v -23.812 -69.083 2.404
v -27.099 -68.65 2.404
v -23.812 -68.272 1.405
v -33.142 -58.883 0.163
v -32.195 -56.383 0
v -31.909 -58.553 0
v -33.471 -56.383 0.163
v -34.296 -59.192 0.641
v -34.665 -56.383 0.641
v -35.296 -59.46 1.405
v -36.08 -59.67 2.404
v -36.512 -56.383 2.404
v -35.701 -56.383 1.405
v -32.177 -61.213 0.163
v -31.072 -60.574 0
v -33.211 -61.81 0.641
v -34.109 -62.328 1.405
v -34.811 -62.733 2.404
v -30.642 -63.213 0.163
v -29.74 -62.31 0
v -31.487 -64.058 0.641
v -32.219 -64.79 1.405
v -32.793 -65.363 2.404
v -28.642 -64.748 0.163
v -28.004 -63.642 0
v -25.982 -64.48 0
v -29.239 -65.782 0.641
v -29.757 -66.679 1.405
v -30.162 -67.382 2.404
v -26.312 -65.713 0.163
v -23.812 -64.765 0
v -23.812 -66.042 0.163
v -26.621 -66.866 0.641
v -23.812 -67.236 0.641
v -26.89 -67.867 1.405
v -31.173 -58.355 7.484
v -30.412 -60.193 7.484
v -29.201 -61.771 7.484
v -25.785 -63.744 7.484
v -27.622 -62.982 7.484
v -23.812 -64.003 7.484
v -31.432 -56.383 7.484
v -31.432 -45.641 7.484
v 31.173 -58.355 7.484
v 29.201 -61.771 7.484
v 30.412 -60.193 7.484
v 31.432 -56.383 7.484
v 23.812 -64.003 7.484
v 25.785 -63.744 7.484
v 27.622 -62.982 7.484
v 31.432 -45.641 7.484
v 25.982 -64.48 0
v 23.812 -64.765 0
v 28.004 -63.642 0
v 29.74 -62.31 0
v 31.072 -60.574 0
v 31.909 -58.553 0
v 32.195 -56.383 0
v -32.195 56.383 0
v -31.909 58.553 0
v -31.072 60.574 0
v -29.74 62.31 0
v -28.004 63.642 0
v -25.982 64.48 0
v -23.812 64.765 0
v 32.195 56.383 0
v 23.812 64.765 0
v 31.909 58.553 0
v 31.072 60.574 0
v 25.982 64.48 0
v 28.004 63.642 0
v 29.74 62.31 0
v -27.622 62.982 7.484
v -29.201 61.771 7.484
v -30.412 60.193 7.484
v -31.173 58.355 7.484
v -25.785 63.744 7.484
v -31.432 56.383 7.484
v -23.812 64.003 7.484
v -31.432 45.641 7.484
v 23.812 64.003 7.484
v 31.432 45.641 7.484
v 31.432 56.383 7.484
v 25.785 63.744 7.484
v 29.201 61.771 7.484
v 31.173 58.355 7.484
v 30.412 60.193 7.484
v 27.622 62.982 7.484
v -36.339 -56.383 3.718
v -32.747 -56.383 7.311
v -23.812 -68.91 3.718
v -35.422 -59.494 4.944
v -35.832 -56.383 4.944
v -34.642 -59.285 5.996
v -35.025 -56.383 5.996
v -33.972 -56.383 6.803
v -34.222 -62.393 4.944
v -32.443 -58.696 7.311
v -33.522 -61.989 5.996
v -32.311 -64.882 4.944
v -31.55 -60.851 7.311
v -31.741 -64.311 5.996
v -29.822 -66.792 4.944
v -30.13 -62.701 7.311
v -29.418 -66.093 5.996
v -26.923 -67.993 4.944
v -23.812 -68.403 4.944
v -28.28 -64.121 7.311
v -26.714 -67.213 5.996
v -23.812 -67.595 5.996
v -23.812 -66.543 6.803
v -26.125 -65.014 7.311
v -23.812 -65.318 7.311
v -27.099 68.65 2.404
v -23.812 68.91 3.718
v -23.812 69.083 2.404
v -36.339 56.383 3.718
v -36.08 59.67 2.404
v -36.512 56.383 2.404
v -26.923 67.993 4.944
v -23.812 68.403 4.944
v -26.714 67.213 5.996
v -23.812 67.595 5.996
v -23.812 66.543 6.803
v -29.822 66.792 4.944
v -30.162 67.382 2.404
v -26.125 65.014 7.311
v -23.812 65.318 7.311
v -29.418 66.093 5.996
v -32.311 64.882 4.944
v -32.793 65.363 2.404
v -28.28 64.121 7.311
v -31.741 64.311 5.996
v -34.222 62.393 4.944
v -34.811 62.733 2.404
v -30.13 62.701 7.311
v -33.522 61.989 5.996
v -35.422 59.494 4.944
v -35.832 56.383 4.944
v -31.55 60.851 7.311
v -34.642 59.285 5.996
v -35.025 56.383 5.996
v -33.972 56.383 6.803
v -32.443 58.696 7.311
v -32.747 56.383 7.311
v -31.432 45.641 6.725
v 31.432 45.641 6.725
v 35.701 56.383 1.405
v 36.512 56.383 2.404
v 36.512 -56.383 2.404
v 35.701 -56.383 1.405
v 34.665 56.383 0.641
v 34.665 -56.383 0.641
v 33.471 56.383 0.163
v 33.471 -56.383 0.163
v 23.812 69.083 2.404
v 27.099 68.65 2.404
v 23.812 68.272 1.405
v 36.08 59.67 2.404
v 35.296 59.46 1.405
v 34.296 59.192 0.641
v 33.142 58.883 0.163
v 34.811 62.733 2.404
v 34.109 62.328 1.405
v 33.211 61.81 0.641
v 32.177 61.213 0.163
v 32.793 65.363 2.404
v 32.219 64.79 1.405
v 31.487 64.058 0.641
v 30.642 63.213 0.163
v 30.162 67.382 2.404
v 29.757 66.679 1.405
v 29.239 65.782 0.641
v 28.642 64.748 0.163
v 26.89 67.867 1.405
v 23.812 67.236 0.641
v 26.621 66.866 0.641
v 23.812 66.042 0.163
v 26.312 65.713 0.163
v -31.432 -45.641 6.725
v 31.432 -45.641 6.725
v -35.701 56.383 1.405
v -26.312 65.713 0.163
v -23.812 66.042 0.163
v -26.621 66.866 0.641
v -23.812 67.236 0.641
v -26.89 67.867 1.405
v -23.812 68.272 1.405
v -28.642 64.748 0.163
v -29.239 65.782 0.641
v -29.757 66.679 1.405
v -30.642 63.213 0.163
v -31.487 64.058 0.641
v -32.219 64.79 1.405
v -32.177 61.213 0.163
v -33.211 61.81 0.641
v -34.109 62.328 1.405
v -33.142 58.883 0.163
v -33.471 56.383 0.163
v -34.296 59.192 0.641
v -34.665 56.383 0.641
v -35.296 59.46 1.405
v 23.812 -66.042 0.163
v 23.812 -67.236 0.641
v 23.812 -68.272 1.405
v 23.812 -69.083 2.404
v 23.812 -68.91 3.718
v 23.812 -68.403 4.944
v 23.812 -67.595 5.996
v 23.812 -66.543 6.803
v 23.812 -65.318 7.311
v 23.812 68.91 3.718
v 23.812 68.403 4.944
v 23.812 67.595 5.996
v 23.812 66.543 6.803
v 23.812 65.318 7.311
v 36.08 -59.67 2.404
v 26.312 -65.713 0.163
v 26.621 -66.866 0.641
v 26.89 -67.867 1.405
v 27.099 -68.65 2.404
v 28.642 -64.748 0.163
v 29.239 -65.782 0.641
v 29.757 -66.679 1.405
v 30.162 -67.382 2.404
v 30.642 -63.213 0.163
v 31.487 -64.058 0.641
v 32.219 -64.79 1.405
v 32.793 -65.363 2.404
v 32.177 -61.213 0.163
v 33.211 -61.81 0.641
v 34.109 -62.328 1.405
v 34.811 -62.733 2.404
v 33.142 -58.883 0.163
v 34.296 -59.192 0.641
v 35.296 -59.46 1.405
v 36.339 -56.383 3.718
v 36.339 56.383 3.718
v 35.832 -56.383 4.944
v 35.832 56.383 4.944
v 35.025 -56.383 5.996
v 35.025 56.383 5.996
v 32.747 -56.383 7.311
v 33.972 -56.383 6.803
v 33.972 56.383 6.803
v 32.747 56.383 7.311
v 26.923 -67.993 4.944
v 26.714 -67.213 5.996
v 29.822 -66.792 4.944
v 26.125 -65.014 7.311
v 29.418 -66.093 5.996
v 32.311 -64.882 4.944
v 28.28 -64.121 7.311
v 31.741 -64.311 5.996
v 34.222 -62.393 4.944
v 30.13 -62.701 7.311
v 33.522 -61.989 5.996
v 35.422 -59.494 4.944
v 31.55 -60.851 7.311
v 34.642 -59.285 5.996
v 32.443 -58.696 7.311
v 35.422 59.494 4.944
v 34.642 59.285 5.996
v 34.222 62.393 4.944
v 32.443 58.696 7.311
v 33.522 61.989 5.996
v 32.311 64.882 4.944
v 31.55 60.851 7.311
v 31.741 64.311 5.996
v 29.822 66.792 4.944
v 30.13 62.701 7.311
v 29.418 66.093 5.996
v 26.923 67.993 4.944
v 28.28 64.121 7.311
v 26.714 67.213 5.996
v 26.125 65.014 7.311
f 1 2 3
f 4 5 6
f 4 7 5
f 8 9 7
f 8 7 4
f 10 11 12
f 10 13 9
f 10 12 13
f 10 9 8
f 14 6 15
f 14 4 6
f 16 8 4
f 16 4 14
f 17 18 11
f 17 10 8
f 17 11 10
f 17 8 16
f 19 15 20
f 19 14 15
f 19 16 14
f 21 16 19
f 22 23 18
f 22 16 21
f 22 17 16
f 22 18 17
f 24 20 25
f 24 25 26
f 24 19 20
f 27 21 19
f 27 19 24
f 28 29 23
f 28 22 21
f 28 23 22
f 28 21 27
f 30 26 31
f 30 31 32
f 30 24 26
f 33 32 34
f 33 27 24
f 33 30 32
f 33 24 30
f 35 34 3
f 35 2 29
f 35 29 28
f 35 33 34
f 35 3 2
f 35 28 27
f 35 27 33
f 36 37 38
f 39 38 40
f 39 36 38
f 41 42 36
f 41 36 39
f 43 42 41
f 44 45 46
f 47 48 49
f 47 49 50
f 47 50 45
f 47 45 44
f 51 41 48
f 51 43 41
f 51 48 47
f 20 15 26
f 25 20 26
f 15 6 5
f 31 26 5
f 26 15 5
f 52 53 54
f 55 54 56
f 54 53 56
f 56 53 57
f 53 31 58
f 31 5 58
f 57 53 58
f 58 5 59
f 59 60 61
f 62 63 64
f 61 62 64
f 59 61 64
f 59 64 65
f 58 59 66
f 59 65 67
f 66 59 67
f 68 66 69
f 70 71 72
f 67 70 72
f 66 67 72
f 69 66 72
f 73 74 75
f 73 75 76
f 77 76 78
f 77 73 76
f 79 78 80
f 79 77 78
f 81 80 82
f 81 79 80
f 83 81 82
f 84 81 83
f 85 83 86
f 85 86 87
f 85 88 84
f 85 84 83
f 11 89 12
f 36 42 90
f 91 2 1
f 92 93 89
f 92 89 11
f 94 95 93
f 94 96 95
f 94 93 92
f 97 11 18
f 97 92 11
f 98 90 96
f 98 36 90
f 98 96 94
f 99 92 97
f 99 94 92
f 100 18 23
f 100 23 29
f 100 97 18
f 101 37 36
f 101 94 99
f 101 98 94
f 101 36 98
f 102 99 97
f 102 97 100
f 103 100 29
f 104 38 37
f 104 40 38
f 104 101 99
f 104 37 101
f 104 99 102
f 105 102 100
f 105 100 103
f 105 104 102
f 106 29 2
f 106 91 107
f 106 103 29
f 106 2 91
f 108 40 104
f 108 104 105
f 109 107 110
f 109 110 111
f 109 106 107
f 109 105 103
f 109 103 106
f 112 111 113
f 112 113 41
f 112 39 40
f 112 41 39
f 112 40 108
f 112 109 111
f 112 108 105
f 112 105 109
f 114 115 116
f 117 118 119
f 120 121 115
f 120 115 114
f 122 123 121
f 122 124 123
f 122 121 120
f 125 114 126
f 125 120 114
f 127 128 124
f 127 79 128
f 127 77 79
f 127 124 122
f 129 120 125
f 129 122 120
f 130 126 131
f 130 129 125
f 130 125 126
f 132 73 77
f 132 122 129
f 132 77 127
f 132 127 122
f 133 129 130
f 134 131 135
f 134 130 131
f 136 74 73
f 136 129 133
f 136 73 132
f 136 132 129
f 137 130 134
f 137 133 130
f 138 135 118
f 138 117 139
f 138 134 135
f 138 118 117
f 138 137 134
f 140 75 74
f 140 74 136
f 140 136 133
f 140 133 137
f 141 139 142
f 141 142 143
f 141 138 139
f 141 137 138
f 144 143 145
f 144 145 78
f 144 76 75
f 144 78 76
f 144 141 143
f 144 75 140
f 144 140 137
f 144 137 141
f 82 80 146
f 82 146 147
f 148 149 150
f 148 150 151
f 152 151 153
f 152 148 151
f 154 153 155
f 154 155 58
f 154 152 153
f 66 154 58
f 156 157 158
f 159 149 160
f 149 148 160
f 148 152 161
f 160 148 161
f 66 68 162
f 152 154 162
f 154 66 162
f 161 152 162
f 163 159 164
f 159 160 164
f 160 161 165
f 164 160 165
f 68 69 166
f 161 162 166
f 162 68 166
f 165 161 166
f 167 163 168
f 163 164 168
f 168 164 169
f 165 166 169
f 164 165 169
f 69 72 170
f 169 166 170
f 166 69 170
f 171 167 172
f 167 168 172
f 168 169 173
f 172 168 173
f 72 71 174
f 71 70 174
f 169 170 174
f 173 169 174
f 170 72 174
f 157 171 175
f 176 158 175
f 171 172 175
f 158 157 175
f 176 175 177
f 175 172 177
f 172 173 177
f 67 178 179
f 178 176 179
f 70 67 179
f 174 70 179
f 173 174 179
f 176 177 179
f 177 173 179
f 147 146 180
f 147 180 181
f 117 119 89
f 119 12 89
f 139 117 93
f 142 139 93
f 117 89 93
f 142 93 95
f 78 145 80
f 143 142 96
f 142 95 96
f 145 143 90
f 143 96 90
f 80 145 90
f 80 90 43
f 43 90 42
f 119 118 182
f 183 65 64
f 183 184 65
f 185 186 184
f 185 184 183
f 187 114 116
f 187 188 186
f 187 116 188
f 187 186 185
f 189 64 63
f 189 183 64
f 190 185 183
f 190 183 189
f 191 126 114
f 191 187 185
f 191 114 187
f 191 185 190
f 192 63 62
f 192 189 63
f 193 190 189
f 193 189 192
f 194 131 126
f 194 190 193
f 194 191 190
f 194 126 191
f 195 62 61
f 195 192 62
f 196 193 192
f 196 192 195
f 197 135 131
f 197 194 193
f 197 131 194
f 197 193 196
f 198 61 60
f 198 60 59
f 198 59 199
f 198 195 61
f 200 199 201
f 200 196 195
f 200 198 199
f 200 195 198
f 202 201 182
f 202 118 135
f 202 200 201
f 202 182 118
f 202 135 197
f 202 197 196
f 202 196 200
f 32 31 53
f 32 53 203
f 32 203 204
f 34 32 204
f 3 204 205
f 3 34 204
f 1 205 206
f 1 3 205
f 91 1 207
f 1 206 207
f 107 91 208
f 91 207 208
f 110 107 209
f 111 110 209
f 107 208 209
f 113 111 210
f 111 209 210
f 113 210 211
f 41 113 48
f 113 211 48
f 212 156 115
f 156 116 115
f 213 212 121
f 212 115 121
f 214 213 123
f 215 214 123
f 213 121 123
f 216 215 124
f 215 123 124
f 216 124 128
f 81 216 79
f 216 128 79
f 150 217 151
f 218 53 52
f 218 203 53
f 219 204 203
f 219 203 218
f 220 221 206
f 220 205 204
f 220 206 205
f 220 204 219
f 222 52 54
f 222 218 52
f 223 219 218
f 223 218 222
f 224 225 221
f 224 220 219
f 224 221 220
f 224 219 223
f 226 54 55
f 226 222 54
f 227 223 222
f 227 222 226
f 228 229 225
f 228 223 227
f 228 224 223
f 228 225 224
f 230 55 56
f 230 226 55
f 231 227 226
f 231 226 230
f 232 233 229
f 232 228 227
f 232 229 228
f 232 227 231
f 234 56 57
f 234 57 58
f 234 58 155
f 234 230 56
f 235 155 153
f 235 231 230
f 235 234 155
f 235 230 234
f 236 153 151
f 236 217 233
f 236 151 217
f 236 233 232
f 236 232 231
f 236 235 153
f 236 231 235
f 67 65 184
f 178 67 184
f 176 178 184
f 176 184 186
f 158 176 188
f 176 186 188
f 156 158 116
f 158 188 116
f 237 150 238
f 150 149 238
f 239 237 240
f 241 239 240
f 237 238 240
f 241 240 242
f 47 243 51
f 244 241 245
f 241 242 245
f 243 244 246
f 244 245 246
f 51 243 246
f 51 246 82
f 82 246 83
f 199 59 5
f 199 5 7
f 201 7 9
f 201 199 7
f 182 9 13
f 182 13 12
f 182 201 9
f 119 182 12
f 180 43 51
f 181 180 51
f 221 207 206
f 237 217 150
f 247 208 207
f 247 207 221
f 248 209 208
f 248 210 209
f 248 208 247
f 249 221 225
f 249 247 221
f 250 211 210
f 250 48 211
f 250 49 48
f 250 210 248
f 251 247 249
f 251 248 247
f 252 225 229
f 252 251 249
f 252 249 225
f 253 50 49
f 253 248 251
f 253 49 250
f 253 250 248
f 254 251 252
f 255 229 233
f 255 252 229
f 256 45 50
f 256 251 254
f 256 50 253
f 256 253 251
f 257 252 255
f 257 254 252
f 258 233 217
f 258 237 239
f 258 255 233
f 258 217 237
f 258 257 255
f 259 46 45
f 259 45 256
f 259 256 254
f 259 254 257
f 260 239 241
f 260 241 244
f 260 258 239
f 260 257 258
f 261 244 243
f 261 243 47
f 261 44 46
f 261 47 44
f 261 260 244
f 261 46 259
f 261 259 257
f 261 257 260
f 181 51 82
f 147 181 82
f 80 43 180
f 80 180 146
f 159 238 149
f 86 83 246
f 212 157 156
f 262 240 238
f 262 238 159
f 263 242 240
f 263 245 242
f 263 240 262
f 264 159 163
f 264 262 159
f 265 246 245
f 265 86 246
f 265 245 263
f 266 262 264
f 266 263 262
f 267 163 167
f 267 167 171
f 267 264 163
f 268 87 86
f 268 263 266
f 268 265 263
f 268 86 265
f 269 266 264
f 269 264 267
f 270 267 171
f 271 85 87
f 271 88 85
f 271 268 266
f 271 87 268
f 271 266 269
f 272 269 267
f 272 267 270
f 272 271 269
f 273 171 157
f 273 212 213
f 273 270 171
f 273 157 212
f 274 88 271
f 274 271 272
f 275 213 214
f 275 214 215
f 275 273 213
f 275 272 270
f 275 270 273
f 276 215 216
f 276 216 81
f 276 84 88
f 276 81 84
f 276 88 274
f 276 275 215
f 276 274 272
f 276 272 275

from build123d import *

# Parameters (mm, degrees)
F1_DEPTH     = 7.4836481363
F2_R         = 5.08
F3_T1_DEPTH  = 47.6248391628
F3_T3_DEPTH  = 112.7664723158
F3_T6_ANGLE  = 90
F3_T8_ANGLE  = 90
F3_T10_ANGLE = 90
F3_T12_ANGLE = 90
F4_W         = 62.8648391628
F4_H         = 91.2811607122
F5_DEPTH     = 0.7581766695


# Not quite as in the source:
# - a fillet or chamfer that OpenCascade refuses, or shapes differently, is made with other operations: its cross-section is extruded or revolved along the edge and cut away or added


with BuildPart() as f1:
    # F0 (on Top) → F1 (new body)
    with BuildSketch(Plane.XY):
        with BuildLine():
            ThreePointArc((36.5124195814, 56.3832361579), (32.7926757025, 65.363492279), (23.8124195814, 69.0832361579))
            Line((23.8124195814, 69.0832361579), (-23.8124195814, 69.0832361579))
            ThreePointArc((-23.8124195814, 69.0832361579), (-32.7926757025, 65.363492279), (-36.5124195814, 56.3832361579))
            Line((-36.5124195814, 56.3832361579), (-36.5124195814, -56.3832361579))
            ThreePointArc((-36.5124195814, -56.3832361579), (-32.7926757025, -65.363492279), (-23.8124195814, -69.0832361579))
            Line((-23.8124195814, -69.0832361579), (23.8124195814, -69.0832361579))
            ThreePointArc((23.8124195814, -69.0832361579), (32.7926757025, -65.363492279), (36.5124195814, -56.3832361579))
            Line((36.5124195814, -56.3832361579), (36.5124195814, 56.3832361579))
        make_face()
    extrude(amount=F1_DEPTH)

    # F2
    f2_edges = [f1.edges().sort_by_distance(p)[0] for p in [
        (0, -69.083236, 7.483648),
    ]]
    fillet(f2_edges, radius=F2_R)

    # F3: fillet of radius 5.08 on 1 edges, made by hand

    # F3_s2 → F3_t1 (cut)
    with BuildSketch(Plane.YZ.offset(-23.8124195814)):
        with BuildLine():
            ThreePointArc((-64.7654194988, 0), (-67.2363032003, 0.6414040808), (-69.0832361579, 2.4036481363))
            Line((-69.0832361579, 2.4036481363), (-69.0832361579, 0))
            Line((-69.0832361579, 0), (-64.7654194988, 0))
        make_face()
        with BuildLine():
            ThreePointArc((64.7654194988, 0), (67.2363032003, 0.6414040808), (69.0832361579, 2.4036481363))
            Line((69.0832361579, 2.4036481363), (69.0832361579, 0))
            Line((69.0832361579, 0), (64.7654194988, 0))
        make_face()
    extrude(amount=F3_T1_DEPTH, mode=Mode.SUBTRACT)

    # F3_s4 → F3_t3 (cut)
    with BuildSketch(Plane.XZ.offset(-56.3832361579)):
        with BuildLine():
            ThreePointArc((36.5124195814, 2.4036481363), (34.6654866238, 0.6414040808), (32.1946029223, 0))
            Line((32.1946029223, 0), (36.5124195814, 0))
            Line((36.5124195814, 0), (36.5124195814, 2.4036481363))
        make_face()
        with BuildLine():
            ThreePointArc((-32.1946029223, 0), (-34.6654866238, 0.6414040808), (-36.5124195814, 2.4036481363))
            Line((-36.5124195814, 2.4036481363), (-36.5124195814, 0))
            Line((-36.5124195814, 0), (-32.1946029223, 0))
        make_face()
    extrude(amount=F3_T3_DEPTH, mode=Mode.SUBTRACT)

    # F3_s5 → F3_t6 (revolve, cut)
    with BuildSketch(Plane.XZ.offset(56.3832361579)):
        with BuildLine():
            ThreePointArc((-32.1946029223, 0), (-34.6654866238, 0.6414040808), (-36.5124195814, 2.4036481363))
            Line((-36.5124195814, 2.4036481363), (-36.5124195814, 0))
            Line((-36.5124195814, 0), (-32.1946029223, 0))
        make_face()
    revolve(axis=Axis((-23.8124195814, -56.3832361579, 0), (0, 0, 1)), revolution_arc=F3_T6_ANGLE, mode=Mode.SUBTRACT)

    # F3_s7 → F3_t8 (revolve, cut)
    with BuildSketch(Plane.YZ.offset(23.8124195814)):
        with BuildLine():
            ThreePointArc((-64.7654194988, 0), (-67.2363032003, 0.6414040808), (-69.0832361579, 2.4036481363))
            Line((-69.0832361579, 2.4036481363), (-69.0832361579, 0))
            Line((-69.0832361579, 0), (-64.7654194988, 0))
        make_face()
    revolve(axis=Axis((23.8124195814, -56.3832361579, 0), (0, 0, 1)), revolution_arc=F3_T8_ANGLE, mode=Mode.SUBTRACT)

    # F3_s9 → F3_t10 (revolve, cut)
    with BuildSketch(Plane.XZ.offset(-56.3832361579)):
        with BuildLine():
            ThreePointArc((36.5124195814, 2.4036481363), (34.6654866238, 0.6414040808), (32.1946029223, 0))
            Line((32.1946029223, 0), (36.5124195814, 0))
            Line((36.5124195814, 0), (36.5124195814, 2.4036481363))
        make_face()
    revolve(axis=Axis((23.8124195814, 56.3832361579, 0), (0, 0, 1)), revolution_arc=F3_T10_ANGLE, mode=Mode.SUBTRACT)

    # F3_s11 → F3_t12 (revolve, cut)
    with BuildSketch(Plane.YZ.offset(-23.8124195814)):
        with BuildLine():
            ThreePointArc((64.7654194988, 0), (67.2363032003, 0.6414040808), (69.0832361579, 2.4036481363))
            Line((69.0832361579, 2.4036481363), (69.0832361579, 0))
            Line((69.0832361579, 0), (64.7654194988, 0))
        make_face()
    revolve(axis=Axis((-23.8124195814, 56.3832361579, 0), (0, 0, 1)), revolution_arc=F3_T12_ANGLE, mode=Mode.SUBTRACT)

    # F4 (on face) → F5 (cut)
    with BuildSketch(Plane.XY.offset(7.4836481363)):
        Rectangle(F4_W, F4_H)
    extrude(amount=-F5_DEPTH, mode=Mode.SUBTRACT)


solid = f1.part
